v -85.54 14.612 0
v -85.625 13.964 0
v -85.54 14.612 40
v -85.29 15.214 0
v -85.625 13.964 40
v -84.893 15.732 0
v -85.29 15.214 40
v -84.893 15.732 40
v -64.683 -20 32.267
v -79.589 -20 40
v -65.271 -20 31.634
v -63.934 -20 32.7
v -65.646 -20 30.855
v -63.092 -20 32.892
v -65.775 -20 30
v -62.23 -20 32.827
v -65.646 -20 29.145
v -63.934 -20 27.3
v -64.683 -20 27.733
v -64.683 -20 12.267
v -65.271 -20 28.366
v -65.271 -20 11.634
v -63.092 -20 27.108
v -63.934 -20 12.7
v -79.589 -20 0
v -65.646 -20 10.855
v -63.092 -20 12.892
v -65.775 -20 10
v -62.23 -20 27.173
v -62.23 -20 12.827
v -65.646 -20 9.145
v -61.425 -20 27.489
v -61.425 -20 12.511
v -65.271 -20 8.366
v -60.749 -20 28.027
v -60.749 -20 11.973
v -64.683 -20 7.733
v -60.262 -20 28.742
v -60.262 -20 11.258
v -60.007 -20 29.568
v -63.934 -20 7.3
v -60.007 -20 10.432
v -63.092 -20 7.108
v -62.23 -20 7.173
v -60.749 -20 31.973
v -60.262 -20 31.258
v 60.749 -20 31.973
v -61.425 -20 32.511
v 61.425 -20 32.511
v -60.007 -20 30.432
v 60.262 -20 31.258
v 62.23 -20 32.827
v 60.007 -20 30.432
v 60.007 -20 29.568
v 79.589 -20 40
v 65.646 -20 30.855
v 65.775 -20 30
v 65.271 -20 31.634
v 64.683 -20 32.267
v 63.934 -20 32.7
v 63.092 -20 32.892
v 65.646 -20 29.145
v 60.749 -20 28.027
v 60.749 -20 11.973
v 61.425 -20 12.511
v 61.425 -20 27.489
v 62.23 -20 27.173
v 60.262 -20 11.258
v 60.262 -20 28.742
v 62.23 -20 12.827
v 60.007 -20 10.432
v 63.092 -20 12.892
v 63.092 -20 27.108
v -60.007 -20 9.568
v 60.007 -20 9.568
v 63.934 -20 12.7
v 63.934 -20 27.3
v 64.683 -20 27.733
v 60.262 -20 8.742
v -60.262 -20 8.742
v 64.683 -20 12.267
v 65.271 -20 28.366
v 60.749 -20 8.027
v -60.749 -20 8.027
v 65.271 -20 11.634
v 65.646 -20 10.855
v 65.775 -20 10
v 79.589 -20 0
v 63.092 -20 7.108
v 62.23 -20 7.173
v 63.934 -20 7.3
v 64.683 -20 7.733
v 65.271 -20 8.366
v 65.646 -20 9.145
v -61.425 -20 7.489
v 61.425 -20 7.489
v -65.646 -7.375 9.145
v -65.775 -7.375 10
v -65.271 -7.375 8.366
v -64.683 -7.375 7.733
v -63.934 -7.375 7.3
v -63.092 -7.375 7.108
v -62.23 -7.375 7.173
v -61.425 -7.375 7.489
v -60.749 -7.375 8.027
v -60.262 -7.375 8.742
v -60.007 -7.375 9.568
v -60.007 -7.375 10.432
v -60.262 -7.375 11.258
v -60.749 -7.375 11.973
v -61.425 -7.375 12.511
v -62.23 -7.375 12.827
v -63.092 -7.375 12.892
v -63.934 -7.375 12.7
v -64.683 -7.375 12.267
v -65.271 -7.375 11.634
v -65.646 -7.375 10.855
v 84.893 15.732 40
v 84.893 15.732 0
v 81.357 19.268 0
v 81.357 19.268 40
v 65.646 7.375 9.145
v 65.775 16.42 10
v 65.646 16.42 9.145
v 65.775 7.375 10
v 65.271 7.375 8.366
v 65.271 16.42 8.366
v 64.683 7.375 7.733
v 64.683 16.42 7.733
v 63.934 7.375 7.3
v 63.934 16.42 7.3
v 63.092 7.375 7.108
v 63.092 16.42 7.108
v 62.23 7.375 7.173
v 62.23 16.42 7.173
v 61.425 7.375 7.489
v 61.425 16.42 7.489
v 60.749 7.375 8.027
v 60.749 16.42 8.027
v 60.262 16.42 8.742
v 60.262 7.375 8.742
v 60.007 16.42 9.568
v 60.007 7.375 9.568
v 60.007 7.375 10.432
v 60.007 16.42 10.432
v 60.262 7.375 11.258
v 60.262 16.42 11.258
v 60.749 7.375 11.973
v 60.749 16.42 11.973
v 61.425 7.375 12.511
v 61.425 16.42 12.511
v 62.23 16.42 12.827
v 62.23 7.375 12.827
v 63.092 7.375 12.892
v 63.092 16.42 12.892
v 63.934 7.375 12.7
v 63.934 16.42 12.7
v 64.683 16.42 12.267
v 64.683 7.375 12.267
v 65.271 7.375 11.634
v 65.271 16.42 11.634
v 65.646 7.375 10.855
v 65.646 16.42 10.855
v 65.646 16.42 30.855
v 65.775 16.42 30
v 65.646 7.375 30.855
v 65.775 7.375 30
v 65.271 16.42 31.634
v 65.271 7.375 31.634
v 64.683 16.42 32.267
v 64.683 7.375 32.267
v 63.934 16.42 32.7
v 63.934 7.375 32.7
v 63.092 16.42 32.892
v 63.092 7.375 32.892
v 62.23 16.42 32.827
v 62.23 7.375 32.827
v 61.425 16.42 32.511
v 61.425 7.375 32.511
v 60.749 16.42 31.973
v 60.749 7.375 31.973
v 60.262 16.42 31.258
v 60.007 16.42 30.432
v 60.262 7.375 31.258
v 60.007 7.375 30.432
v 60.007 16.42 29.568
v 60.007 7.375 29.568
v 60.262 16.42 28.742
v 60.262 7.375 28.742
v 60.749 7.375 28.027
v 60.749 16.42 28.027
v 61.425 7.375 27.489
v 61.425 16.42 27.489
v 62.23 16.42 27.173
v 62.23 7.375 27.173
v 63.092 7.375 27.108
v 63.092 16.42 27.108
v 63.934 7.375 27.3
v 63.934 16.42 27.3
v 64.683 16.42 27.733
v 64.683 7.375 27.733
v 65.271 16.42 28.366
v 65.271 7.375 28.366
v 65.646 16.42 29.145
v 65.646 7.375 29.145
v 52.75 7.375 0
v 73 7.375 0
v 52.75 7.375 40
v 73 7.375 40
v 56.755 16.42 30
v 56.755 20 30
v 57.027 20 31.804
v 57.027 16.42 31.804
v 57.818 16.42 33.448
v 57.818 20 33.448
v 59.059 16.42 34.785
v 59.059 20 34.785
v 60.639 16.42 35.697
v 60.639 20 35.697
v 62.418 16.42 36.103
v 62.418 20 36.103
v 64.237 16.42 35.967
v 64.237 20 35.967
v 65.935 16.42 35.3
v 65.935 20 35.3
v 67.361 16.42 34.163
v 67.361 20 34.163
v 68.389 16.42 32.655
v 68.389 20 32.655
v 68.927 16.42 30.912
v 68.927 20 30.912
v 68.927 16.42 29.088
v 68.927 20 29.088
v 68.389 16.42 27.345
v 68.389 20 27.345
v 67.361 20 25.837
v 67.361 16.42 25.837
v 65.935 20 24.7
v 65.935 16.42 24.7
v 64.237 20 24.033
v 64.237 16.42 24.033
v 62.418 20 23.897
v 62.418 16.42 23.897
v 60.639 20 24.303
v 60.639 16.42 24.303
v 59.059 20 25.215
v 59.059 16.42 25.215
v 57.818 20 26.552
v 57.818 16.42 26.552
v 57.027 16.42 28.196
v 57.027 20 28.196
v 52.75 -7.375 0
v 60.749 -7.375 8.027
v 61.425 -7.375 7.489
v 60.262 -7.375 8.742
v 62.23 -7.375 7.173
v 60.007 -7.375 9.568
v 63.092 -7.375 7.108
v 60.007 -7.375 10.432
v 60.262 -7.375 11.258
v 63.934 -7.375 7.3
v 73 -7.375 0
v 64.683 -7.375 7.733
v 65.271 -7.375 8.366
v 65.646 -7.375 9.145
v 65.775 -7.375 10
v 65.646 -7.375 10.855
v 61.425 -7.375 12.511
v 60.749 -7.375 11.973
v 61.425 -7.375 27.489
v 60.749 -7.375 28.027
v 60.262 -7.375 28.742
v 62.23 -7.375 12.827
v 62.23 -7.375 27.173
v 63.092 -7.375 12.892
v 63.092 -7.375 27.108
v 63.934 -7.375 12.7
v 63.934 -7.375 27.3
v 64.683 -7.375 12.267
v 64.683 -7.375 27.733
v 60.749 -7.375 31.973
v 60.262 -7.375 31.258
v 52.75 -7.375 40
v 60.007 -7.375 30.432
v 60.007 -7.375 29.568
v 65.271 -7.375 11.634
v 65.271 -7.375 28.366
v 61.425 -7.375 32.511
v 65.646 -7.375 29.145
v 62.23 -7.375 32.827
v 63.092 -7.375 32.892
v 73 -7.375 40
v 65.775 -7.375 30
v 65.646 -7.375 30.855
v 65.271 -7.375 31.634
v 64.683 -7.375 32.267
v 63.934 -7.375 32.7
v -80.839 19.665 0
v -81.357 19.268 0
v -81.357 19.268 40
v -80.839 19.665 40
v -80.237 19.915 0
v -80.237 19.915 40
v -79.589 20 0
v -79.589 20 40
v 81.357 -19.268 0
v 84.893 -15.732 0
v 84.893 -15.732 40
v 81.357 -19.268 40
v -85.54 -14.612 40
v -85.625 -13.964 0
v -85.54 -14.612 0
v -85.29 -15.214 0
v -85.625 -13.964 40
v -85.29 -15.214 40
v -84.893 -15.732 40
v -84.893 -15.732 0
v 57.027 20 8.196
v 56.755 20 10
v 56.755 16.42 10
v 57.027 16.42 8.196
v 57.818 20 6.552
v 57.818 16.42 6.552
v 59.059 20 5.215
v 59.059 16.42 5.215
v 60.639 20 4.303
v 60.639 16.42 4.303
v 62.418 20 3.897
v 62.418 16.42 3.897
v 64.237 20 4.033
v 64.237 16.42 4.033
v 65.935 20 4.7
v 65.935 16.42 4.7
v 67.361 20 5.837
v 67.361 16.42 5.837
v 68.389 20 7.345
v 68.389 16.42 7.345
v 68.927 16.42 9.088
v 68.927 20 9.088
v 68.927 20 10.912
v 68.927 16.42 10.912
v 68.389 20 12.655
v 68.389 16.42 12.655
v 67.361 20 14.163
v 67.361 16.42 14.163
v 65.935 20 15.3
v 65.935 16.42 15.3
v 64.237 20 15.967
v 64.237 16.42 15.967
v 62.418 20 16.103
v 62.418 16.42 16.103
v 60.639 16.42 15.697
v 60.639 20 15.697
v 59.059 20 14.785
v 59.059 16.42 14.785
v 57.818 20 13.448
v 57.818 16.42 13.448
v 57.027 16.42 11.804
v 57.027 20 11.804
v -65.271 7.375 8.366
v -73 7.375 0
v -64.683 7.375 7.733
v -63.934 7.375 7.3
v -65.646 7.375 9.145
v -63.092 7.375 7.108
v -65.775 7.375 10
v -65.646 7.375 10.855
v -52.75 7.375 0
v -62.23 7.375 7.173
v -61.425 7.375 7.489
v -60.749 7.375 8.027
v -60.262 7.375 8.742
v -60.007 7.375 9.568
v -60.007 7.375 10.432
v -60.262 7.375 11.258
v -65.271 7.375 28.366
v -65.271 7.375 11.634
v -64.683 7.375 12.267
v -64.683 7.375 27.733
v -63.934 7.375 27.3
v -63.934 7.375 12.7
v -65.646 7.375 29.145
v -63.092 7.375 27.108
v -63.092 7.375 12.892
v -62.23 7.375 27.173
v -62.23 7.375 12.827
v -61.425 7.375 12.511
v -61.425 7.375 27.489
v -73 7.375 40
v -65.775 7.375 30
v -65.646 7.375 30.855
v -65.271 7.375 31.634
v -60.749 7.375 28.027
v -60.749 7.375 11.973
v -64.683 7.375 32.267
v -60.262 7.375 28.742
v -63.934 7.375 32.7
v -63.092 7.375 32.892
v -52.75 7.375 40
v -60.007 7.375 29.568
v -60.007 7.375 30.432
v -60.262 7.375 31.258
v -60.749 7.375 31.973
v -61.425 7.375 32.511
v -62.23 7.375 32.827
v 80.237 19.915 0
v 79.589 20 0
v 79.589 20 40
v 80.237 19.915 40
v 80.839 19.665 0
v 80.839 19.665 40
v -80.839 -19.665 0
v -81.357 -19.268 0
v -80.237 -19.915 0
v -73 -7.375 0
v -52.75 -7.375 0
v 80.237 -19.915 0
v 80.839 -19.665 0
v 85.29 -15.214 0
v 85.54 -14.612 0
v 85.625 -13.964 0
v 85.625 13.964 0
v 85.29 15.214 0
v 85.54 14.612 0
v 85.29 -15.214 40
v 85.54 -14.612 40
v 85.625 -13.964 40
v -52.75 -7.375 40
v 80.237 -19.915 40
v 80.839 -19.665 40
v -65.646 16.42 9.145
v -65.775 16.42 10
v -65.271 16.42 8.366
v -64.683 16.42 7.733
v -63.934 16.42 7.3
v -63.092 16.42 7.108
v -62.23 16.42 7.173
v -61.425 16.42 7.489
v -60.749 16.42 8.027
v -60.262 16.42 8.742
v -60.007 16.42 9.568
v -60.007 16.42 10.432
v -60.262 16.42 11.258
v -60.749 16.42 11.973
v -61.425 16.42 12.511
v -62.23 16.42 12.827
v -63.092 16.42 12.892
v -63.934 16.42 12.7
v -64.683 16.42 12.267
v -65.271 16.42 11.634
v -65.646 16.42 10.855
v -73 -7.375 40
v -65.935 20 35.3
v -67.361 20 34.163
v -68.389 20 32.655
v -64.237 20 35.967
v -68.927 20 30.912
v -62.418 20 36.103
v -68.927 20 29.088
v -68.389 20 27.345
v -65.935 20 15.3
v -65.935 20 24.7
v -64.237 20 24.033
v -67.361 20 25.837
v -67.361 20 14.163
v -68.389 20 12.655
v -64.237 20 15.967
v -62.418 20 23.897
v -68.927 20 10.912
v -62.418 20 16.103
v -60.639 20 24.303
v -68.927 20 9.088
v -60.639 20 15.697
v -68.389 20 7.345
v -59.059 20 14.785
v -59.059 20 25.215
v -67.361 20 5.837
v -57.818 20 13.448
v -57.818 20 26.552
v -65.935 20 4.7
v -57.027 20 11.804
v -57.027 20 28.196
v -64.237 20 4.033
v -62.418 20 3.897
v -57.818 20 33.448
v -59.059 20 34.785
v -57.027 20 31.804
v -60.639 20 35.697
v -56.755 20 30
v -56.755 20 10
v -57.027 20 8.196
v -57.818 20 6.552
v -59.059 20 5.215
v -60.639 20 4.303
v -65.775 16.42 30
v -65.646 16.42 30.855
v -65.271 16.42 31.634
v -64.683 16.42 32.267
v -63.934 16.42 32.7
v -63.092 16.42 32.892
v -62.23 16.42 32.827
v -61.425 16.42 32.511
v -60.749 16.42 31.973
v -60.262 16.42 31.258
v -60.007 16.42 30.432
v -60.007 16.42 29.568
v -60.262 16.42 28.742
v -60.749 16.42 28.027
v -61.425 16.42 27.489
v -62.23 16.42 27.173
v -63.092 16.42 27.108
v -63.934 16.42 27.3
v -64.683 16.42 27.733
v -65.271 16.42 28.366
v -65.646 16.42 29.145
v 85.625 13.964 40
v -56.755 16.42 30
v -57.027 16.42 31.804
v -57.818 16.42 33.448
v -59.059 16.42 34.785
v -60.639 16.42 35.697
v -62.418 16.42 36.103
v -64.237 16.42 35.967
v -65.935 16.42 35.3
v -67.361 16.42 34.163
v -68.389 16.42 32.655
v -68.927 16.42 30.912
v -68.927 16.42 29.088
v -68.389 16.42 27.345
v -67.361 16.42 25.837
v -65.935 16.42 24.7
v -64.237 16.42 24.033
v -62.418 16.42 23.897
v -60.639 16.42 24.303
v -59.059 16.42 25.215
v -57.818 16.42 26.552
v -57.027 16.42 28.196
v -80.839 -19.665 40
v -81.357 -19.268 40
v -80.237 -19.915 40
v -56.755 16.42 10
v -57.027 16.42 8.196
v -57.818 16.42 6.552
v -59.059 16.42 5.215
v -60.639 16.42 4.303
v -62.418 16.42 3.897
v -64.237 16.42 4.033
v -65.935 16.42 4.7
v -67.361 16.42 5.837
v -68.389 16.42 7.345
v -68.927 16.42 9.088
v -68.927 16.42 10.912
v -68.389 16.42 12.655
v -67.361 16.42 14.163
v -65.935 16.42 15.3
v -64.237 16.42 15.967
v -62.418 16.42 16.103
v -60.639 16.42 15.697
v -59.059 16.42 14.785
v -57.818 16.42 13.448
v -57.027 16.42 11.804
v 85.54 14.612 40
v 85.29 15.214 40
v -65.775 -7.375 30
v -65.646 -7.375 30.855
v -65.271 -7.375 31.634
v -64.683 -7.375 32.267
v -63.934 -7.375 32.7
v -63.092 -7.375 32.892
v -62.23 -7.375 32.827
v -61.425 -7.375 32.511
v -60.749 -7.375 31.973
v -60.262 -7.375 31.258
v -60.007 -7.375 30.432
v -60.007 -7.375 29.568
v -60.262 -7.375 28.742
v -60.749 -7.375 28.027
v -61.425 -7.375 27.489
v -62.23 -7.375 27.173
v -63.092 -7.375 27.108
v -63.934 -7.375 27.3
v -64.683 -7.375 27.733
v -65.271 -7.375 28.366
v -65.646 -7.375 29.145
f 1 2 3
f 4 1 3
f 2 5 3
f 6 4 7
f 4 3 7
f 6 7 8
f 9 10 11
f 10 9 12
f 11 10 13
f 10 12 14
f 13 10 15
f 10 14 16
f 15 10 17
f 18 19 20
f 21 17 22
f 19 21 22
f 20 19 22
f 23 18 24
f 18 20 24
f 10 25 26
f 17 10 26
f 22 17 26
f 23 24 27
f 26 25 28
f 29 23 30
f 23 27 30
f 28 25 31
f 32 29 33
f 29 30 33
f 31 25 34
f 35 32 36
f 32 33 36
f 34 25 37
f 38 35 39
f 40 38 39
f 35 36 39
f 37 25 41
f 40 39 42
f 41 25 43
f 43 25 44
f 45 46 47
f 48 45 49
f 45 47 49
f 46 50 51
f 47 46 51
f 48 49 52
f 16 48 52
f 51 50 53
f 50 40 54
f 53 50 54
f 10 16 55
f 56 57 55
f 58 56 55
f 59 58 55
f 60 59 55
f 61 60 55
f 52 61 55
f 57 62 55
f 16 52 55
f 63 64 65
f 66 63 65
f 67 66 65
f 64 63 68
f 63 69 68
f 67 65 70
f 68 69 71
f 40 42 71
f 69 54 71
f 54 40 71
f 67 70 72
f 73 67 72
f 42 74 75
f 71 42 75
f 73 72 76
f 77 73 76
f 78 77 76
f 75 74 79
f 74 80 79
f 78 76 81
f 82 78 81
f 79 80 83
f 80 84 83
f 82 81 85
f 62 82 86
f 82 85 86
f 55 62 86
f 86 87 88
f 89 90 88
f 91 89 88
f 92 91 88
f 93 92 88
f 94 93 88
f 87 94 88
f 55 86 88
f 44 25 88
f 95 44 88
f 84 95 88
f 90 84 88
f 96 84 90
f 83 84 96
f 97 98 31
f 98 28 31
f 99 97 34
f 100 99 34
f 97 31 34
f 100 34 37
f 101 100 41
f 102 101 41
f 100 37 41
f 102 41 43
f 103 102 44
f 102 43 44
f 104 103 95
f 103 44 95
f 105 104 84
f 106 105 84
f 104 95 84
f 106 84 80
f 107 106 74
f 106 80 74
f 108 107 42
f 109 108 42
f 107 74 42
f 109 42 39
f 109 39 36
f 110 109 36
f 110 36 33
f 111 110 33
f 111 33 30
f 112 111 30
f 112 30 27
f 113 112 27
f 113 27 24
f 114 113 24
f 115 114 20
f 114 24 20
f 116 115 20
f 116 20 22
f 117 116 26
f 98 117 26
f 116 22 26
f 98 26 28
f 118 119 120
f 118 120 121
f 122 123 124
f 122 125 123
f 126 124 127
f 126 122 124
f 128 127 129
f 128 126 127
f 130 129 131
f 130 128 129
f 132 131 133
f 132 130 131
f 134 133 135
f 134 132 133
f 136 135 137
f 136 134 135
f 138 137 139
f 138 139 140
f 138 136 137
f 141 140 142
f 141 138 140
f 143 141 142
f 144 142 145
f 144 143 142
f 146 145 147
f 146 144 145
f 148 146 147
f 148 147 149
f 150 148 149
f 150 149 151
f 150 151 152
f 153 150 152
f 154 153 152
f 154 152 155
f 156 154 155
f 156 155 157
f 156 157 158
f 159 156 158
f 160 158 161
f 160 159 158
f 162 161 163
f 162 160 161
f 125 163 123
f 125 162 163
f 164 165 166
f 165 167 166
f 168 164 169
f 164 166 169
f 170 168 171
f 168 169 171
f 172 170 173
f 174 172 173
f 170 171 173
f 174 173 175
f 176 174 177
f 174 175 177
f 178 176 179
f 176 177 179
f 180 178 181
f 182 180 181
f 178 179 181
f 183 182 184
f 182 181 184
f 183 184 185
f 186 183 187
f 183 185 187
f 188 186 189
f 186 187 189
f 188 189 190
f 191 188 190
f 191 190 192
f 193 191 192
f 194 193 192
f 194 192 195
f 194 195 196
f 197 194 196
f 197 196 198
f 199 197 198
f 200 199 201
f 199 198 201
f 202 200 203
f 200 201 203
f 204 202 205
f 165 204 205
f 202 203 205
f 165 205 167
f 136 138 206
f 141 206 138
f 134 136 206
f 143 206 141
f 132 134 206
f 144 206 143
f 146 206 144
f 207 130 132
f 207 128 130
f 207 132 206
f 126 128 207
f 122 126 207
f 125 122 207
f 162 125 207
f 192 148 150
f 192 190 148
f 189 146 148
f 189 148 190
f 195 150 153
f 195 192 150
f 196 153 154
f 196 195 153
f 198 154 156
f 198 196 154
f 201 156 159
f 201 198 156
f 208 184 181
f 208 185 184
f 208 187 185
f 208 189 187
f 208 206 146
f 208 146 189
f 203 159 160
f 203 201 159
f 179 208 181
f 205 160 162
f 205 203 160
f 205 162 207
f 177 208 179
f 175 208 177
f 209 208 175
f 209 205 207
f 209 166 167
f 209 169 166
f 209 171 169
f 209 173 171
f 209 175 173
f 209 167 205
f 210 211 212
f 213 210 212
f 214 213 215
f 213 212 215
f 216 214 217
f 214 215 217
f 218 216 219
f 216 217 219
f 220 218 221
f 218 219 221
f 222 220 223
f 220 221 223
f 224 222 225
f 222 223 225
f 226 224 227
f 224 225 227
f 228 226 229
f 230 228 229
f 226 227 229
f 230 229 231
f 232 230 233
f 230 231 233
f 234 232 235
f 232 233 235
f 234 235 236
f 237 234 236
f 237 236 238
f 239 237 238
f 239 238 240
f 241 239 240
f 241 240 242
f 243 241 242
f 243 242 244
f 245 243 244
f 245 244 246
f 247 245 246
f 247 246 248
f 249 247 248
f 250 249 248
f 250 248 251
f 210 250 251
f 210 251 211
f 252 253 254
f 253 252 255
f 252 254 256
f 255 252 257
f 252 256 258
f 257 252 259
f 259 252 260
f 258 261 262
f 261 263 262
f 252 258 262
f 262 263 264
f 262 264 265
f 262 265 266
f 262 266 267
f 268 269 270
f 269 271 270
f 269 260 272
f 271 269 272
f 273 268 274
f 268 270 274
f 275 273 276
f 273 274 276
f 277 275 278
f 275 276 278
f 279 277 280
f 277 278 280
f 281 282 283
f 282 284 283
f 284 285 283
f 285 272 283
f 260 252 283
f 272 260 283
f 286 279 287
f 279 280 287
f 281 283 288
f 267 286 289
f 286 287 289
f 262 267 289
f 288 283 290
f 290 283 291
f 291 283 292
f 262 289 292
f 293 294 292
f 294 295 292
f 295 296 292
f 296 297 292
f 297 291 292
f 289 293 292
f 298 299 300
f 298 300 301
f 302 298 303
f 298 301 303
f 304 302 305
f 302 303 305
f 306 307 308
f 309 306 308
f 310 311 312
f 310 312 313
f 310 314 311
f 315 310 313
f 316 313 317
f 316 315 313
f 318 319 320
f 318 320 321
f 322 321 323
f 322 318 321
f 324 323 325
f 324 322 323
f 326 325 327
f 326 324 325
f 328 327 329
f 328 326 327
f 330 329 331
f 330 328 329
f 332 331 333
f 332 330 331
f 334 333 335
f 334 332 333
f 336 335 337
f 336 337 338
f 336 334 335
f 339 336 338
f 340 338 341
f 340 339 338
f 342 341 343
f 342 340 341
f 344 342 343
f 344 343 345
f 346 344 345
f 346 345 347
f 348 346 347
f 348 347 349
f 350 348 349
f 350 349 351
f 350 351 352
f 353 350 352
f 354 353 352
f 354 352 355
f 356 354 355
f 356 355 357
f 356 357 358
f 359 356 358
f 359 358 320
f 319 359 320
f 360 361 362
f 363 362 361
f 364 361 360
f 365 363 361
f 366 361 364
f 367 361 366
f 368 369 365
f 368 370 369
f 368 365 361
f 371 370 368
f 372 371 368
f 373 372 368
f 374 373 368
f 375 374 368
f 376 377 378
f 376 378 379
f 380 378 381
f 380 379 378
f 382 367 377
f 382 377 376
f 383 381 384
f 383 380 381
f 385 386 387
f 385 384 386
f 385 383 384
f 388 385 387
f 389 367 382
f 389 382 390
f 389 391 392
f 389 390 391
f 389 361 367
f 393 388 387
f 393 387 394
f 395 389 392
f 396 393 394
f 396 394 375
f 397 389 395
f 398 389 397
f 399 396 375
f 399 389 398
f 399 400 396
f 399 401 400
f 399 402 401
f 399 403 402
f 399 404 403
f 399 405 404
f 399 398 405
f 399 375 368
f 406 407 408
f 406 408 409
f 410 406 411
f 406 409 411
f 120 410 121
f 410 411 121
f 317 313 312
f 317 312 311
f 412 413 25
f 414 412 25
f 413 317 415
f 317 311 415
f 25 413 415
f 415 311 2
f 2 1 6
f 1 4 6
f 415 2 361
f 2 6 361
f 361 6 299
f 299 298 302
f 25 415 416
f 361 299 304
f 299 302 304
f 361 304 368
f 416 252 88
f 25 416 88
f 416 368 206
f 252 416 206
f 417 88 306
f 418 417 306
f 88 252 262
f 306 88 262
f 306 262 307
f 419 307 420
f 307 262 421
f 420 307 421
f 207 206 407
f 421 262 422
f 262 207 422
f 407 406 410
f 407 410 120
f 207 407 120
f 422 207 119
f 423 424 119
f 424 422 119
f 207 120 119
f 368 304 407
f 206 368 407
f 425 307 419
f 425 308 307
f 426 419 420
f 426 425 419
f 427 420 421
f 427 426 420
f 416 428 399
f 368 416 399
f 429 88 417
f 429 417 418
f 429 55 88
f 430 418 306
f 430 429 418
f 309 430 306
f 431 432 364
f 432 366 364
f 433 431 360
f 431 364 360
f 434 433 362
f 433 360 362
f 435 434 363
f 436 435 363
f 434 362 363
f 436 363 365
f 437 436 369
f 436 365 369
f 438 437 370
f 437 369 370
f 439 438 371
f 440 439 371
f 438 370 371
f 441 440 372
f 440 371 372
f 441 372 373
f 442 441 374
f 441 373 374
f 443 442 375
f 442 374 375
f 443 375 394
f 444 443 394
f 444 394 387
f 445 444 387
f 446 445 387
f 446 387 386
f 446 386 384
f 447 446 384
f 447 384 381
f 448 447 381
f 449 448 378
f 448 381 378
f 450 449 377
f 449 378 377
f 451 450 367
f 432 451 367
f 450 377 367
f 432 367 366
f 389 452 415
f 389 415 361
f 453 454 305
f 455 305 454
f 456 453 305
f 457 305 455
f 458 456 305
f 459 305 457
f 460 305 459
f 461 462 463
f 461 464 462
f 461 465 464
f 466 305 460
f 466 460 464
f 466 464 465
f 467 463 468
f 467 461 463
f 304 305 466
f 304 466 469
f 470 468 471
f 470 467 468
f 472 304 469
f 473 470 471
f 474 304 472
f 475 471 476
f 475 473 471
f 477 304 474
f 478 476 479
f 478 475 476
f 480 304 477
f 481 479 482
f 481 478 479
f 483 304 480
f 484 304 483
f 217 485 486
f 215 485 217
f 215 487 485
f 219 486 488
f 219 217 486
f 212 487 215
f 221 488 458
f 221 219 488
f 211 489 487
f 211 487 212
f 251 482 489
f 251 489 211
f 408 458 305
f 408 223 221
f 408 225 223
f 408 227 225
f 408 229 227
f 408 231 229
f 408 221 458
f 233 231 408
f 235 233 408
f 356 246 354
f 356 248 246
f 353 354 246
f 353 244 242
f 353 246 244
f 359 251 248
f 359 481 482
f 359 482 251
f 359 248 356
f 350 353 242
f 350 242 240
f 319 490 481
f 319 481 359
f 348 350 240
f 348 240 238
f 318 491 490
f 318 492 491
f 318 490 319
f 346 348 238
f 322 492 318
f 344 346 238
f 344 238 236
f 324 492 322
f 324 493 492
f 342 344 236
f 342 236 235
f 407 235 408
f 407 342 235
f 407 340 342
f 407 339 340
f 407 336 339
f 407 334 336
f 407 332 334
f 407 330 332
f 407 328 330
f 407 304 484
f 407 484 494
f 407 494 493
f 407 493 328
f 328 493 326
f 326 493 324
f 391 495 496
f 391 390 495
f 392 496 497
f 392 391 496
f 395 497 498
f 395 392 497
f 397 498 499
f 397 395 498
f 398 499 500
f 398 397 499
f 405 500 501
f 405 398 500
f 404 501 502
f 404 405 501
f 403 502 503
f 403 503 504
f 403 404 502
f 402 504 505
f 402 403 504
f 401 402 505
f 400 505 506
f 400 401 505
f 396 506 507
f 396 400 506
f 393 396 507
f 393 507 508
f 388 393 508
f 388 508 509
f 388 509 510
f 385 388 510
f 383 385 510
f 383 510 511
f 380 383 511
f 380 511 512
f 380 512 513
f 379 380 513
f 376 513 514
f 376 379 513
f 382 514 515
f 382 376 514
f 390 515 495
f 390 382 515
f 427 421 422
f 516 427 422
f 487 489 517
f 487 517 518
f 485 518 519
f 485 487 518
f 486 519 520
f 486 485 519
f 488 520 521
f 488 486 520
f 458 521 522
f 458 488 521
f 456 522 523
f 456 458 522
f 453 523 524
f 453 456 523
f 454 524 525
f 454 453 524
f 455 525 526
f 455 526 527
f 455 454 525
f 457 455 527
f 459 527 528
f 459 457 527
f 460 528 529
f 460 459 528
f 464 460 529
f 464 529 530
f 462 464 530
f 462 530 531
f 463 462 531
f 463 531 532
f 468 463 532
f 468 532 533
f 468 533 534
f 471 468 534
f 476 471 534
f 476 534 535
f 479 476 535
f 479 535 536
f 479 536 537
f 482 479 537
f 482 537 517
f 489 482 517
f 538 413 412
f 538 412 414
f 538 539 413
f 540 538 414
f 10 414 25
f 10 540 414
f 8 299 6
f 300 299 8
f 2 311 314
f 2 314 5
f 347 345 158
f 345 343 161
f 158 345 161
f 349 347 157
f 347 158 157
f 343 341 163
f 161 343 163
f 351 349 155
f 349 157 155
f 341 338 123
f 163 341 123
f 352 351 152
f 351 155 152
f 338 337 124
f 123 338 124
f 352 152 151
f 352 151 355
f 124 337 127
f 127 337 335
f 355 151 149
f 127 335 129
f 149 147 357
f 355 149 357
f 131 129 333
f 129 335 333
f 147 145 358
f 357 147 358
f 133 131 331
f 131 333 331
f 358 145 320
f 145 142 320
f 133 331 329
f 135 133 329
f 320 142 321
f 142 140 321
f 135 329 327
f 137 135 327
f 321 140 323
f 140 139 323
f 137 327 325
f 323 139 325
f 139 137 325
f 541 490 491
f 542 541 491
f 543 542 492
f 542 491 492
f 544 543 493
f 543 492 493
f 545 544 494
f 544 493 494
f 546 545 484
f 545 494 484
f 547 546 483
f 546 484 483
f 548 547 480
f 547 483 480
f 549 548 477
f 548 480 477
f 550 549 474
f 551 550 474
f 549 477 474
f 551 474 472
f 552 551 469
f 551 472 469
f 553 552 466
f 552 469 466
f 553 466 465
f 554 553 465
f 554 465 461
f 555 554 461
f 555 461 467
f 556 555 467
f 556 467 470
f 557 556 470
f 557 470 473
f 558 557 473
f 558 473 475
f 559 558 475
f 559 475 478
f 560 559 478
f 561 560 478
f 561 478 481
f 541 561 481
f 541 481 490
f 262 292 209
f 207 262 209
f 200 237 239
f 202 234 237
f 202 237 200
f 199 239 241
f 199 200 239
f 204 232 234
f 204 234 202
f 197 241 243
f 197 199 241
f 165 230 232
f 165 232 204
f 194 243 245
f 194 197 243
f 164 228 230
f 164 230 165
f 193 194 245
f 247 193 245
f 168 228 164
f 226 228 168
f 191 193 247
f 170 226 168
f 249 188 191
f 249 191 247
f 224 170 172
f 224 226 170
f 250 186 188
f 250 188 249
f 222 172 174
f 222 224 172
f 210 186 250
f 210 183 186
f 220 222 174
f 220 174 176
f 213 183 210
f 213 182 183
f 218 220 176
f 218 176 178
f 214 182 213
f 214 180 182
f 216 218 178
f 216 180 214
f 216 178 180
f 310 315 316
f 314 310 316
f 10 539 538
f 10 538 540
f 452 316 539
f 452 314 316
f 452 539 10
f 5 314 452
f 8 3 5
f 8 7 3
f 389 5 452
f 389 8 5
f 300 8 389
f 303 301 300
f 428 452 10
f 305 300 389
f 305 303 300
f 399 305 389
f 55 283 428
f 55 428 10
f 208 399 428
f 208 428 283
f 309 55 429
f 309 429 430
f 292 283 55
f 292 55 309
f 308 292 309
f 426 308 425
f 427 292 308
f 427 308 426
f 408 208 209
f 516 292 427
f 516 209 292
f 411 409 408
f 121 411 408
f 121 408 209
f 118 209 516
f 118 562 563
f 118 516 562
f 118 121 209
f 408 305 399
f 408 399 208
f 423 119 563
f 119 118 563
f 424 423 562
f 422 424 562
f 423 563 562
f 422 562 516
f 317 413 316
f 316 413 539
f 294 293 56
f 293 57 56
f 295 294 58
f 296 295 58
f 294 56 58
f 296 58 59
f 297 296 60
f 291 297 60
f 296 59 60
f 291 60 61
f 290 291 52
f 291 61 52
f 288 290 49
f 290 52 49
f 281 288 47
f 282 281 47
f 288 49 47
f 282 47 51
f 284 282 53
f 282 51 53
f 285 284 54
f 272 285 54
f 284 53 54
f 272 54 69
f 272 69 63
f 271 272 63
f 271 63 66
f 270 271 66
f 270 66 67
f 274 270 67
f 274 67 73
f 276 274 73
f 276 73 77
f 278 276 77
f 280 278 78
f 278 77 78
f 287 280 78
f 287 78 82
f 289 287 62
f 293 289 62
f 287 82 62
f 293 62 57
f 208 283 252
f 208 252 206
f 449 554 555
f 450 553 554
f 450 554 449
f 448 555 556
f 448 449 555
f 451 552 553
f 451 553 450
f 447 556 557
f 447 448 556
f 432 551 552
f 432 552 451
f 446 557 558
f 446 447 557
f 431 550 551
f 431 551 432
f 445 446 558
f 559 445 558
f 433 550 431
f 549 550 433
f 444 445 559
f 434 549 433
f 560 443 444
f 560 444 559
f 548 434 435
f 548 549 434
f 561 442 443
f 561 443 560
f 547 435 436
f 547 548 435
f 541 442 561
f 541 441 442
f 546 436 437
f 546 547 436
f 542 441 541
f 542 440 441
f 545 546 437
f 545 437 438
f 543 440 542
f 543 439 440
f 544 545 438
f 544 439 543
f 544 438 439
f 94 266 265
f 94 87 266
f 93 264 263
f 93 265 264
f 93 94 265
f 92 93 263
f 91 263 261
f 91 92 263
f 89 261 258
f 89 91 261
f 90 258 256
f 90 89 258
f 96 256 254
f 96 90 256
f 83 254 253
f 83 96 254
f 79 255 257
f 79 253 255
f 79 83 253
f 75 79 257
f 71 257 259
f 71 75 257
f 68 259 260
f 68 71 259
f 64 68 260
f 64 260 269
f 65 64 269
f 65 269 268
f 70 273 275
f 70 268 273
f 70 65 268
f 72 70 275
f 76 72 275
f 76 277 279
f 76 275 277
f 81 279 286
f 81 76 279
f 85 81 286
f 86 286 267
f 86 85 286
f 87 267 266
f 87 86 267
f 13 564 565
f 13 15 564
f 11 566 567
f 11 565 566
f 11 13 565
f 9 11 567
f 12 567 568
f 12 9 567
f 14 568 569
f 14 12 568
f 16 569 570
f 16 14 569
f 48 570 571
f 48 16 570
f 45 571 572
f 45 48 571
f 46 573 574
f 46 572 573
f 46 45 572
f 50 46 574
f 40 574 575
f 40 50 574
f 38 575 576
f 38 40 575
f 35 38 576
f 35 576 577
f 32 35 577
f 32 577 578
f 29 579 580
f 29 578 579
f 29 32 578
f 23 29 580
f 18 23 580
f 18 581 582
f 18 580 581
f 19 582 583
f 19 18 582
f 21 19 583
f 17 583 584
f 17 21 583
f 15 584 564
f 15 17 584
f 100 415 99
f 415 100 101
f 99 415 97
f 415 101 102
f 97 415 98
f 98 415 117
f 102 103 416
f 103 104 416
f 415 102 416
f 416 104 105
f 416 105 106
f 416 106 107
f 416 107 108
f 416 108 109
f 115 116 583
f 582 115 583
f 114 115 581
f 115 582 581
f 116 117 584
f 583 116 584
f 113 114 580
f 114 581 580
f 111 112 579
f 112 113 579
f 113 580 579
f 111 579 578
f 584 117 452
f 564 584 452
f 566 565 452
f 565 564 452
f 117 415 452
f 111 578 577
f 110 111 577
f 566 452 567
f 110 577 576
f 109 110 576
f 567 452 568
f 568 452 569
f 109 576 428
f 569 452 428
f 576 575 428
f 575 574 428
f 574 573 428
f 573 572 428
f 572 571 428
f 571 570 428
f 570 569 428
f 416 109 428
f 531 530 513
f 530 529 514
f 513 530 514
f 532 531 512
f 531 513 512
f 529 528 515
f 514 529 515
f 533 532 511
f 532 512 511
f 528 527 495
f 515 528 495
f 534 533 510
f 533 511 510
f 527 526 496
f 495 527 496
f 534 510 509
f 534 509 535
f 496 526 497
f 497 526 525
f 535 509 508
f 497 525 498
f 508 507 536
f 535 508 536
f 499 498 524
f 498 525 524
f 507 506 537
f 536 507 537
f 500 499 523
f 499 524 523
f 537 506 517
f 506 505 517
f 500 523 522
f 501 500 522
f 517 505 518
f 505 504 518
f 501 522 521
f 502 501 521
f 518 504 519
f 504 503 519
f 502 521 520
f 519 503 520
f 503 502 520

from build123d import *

# Parameters (mm, degrees)
SKETCH2_W                               = 171.25
SKETCH2_H                               = 40
BOSS_EXTRUDE1_DEPTH                     = 40
SKETCH3_W                               = 20.25
SKETCH3_H                               = 14.75
CUT_EXTRUDE1_DEPTH                      = 97.600417313
CHAMFER1_SIZE                           = 5
FILLET1_R                               = 2.5
CBORE_FOR_M5_HEX_HEAD_BOLT1_D           = 5.8
CBORE_FOR_M5_HEX_HEAD_BOLT1_CBORE_D     = 12.24
CBORE_FOR_M5_HEX_HEAD_BOLT1_CBORE_DEPTH = 3.58
MIRROR2_COPY_1_D                        = 5.8
MIRROR2_COPY_1_CBORE_D                  = 12.24
MIRROR2_COPY_1_CBORE_DEPTH              = 3.58


with BuildPart() as part:
    # Sketch2 → Boss-Extrude1 (new body)
    with BuildSketch(Plane.XY):
        Rectangle(SKETCH2_W, SKETCH2_H)
    extrude(amount=BOSS_EXTRUDE1_DEPTH)

    # Sketch3 → Cut-Extrude1 (cut, through all)
    with BuildSketch(Plane.XY.offset(40)):
        with Locations((-62.875, 0)):
            Rectangle(SKETCH3_W, SKETCH3_H)
        with Locations((62.875, 0)):
            Rectangle(SKETCH3_W, SKETCH3_H)
    extrude(amount=-CUT_EXTRUDE1_DEPTH, mode=Mode.SUBTRACT)

    # Chamfer1
    chamfer1_edges = [part.edges().sort_by_distance(p)[0] for p in [
        (85.625, -20, 20),
        (-85.625, -20, 20),
        (-85.625, 20, 20),
        (85.625, 20, 20),
    ]]
    chamfer(chamfer1_edges, length=CHAMFER1_SIZE)

    # Fillet1
    fillet1_edges = [part.edges().sort_by_distance(p)[0] for p in [
        (-80.625, 20, 20),
        (80.625, 20, 20),
        (85.625, -15, 20),
        (85.625, 15, 20),
        (-80.625, -20, 20),
        (80.625, -20, 20),
        (-85.625, 15, 20),
        (-85.625, -15, 20),
    ]]
    fillet(fillet1_edges, radius=FILLET1_R)

    # CBORE for M5 Hex Head Bolt1 (through all)
    with Locations(Plane(origin=(0, 20, 0), x_dir=(1, 0, 0), z_dir=(0, 1, 0))):
        with Locations((-62.875, -10)):
            cbore_for_m5_hex_head_bolt1 = CounterBoreHole(CBORE_FOR_M5_HEX_HEAD_BOLT1_D / 2, CBORE_FOR_M5_HEX_HEAD_BOLT1_CBORE_D / 2, CBORE_FOR_M5_HEX_HEAD_BOLT1_CBORE_DEPTH)

    # Mirror1: CBORE for M5 Hex Head Bolt1 across plane
    add(cbore_for_m5_hex_head_bolt1.mirror(Plane.XY.offset(20)), mode=Mode.SUBTRACT)

    # Mirror2: CBORE for M5 Hex Head Bolt1 across plane
    add(cbore_for_m5_hex_head_bolt1.mirror(Plane(origin=(0, 0, 0), x_dir=(0, 0, 1), z_dir=(1, 0, 0))), mode=Mode.SUBTRACT)

    # Mirror2 copy 1 (through all)
    with Locations(Plane(origin=(0, 20, 40), x_dir=(-1, 0, 0), z_dir=(0, 1, 0))):
        with Locations((-62.875, -10)):
            CounterBoreHole(MIRROR2_COPY_1_D / 2, MIRROR2_COPY_1_CBORE_D / 2, MIRROR2_COPY_1_CBORE_DEPTH)


solid = part.part
